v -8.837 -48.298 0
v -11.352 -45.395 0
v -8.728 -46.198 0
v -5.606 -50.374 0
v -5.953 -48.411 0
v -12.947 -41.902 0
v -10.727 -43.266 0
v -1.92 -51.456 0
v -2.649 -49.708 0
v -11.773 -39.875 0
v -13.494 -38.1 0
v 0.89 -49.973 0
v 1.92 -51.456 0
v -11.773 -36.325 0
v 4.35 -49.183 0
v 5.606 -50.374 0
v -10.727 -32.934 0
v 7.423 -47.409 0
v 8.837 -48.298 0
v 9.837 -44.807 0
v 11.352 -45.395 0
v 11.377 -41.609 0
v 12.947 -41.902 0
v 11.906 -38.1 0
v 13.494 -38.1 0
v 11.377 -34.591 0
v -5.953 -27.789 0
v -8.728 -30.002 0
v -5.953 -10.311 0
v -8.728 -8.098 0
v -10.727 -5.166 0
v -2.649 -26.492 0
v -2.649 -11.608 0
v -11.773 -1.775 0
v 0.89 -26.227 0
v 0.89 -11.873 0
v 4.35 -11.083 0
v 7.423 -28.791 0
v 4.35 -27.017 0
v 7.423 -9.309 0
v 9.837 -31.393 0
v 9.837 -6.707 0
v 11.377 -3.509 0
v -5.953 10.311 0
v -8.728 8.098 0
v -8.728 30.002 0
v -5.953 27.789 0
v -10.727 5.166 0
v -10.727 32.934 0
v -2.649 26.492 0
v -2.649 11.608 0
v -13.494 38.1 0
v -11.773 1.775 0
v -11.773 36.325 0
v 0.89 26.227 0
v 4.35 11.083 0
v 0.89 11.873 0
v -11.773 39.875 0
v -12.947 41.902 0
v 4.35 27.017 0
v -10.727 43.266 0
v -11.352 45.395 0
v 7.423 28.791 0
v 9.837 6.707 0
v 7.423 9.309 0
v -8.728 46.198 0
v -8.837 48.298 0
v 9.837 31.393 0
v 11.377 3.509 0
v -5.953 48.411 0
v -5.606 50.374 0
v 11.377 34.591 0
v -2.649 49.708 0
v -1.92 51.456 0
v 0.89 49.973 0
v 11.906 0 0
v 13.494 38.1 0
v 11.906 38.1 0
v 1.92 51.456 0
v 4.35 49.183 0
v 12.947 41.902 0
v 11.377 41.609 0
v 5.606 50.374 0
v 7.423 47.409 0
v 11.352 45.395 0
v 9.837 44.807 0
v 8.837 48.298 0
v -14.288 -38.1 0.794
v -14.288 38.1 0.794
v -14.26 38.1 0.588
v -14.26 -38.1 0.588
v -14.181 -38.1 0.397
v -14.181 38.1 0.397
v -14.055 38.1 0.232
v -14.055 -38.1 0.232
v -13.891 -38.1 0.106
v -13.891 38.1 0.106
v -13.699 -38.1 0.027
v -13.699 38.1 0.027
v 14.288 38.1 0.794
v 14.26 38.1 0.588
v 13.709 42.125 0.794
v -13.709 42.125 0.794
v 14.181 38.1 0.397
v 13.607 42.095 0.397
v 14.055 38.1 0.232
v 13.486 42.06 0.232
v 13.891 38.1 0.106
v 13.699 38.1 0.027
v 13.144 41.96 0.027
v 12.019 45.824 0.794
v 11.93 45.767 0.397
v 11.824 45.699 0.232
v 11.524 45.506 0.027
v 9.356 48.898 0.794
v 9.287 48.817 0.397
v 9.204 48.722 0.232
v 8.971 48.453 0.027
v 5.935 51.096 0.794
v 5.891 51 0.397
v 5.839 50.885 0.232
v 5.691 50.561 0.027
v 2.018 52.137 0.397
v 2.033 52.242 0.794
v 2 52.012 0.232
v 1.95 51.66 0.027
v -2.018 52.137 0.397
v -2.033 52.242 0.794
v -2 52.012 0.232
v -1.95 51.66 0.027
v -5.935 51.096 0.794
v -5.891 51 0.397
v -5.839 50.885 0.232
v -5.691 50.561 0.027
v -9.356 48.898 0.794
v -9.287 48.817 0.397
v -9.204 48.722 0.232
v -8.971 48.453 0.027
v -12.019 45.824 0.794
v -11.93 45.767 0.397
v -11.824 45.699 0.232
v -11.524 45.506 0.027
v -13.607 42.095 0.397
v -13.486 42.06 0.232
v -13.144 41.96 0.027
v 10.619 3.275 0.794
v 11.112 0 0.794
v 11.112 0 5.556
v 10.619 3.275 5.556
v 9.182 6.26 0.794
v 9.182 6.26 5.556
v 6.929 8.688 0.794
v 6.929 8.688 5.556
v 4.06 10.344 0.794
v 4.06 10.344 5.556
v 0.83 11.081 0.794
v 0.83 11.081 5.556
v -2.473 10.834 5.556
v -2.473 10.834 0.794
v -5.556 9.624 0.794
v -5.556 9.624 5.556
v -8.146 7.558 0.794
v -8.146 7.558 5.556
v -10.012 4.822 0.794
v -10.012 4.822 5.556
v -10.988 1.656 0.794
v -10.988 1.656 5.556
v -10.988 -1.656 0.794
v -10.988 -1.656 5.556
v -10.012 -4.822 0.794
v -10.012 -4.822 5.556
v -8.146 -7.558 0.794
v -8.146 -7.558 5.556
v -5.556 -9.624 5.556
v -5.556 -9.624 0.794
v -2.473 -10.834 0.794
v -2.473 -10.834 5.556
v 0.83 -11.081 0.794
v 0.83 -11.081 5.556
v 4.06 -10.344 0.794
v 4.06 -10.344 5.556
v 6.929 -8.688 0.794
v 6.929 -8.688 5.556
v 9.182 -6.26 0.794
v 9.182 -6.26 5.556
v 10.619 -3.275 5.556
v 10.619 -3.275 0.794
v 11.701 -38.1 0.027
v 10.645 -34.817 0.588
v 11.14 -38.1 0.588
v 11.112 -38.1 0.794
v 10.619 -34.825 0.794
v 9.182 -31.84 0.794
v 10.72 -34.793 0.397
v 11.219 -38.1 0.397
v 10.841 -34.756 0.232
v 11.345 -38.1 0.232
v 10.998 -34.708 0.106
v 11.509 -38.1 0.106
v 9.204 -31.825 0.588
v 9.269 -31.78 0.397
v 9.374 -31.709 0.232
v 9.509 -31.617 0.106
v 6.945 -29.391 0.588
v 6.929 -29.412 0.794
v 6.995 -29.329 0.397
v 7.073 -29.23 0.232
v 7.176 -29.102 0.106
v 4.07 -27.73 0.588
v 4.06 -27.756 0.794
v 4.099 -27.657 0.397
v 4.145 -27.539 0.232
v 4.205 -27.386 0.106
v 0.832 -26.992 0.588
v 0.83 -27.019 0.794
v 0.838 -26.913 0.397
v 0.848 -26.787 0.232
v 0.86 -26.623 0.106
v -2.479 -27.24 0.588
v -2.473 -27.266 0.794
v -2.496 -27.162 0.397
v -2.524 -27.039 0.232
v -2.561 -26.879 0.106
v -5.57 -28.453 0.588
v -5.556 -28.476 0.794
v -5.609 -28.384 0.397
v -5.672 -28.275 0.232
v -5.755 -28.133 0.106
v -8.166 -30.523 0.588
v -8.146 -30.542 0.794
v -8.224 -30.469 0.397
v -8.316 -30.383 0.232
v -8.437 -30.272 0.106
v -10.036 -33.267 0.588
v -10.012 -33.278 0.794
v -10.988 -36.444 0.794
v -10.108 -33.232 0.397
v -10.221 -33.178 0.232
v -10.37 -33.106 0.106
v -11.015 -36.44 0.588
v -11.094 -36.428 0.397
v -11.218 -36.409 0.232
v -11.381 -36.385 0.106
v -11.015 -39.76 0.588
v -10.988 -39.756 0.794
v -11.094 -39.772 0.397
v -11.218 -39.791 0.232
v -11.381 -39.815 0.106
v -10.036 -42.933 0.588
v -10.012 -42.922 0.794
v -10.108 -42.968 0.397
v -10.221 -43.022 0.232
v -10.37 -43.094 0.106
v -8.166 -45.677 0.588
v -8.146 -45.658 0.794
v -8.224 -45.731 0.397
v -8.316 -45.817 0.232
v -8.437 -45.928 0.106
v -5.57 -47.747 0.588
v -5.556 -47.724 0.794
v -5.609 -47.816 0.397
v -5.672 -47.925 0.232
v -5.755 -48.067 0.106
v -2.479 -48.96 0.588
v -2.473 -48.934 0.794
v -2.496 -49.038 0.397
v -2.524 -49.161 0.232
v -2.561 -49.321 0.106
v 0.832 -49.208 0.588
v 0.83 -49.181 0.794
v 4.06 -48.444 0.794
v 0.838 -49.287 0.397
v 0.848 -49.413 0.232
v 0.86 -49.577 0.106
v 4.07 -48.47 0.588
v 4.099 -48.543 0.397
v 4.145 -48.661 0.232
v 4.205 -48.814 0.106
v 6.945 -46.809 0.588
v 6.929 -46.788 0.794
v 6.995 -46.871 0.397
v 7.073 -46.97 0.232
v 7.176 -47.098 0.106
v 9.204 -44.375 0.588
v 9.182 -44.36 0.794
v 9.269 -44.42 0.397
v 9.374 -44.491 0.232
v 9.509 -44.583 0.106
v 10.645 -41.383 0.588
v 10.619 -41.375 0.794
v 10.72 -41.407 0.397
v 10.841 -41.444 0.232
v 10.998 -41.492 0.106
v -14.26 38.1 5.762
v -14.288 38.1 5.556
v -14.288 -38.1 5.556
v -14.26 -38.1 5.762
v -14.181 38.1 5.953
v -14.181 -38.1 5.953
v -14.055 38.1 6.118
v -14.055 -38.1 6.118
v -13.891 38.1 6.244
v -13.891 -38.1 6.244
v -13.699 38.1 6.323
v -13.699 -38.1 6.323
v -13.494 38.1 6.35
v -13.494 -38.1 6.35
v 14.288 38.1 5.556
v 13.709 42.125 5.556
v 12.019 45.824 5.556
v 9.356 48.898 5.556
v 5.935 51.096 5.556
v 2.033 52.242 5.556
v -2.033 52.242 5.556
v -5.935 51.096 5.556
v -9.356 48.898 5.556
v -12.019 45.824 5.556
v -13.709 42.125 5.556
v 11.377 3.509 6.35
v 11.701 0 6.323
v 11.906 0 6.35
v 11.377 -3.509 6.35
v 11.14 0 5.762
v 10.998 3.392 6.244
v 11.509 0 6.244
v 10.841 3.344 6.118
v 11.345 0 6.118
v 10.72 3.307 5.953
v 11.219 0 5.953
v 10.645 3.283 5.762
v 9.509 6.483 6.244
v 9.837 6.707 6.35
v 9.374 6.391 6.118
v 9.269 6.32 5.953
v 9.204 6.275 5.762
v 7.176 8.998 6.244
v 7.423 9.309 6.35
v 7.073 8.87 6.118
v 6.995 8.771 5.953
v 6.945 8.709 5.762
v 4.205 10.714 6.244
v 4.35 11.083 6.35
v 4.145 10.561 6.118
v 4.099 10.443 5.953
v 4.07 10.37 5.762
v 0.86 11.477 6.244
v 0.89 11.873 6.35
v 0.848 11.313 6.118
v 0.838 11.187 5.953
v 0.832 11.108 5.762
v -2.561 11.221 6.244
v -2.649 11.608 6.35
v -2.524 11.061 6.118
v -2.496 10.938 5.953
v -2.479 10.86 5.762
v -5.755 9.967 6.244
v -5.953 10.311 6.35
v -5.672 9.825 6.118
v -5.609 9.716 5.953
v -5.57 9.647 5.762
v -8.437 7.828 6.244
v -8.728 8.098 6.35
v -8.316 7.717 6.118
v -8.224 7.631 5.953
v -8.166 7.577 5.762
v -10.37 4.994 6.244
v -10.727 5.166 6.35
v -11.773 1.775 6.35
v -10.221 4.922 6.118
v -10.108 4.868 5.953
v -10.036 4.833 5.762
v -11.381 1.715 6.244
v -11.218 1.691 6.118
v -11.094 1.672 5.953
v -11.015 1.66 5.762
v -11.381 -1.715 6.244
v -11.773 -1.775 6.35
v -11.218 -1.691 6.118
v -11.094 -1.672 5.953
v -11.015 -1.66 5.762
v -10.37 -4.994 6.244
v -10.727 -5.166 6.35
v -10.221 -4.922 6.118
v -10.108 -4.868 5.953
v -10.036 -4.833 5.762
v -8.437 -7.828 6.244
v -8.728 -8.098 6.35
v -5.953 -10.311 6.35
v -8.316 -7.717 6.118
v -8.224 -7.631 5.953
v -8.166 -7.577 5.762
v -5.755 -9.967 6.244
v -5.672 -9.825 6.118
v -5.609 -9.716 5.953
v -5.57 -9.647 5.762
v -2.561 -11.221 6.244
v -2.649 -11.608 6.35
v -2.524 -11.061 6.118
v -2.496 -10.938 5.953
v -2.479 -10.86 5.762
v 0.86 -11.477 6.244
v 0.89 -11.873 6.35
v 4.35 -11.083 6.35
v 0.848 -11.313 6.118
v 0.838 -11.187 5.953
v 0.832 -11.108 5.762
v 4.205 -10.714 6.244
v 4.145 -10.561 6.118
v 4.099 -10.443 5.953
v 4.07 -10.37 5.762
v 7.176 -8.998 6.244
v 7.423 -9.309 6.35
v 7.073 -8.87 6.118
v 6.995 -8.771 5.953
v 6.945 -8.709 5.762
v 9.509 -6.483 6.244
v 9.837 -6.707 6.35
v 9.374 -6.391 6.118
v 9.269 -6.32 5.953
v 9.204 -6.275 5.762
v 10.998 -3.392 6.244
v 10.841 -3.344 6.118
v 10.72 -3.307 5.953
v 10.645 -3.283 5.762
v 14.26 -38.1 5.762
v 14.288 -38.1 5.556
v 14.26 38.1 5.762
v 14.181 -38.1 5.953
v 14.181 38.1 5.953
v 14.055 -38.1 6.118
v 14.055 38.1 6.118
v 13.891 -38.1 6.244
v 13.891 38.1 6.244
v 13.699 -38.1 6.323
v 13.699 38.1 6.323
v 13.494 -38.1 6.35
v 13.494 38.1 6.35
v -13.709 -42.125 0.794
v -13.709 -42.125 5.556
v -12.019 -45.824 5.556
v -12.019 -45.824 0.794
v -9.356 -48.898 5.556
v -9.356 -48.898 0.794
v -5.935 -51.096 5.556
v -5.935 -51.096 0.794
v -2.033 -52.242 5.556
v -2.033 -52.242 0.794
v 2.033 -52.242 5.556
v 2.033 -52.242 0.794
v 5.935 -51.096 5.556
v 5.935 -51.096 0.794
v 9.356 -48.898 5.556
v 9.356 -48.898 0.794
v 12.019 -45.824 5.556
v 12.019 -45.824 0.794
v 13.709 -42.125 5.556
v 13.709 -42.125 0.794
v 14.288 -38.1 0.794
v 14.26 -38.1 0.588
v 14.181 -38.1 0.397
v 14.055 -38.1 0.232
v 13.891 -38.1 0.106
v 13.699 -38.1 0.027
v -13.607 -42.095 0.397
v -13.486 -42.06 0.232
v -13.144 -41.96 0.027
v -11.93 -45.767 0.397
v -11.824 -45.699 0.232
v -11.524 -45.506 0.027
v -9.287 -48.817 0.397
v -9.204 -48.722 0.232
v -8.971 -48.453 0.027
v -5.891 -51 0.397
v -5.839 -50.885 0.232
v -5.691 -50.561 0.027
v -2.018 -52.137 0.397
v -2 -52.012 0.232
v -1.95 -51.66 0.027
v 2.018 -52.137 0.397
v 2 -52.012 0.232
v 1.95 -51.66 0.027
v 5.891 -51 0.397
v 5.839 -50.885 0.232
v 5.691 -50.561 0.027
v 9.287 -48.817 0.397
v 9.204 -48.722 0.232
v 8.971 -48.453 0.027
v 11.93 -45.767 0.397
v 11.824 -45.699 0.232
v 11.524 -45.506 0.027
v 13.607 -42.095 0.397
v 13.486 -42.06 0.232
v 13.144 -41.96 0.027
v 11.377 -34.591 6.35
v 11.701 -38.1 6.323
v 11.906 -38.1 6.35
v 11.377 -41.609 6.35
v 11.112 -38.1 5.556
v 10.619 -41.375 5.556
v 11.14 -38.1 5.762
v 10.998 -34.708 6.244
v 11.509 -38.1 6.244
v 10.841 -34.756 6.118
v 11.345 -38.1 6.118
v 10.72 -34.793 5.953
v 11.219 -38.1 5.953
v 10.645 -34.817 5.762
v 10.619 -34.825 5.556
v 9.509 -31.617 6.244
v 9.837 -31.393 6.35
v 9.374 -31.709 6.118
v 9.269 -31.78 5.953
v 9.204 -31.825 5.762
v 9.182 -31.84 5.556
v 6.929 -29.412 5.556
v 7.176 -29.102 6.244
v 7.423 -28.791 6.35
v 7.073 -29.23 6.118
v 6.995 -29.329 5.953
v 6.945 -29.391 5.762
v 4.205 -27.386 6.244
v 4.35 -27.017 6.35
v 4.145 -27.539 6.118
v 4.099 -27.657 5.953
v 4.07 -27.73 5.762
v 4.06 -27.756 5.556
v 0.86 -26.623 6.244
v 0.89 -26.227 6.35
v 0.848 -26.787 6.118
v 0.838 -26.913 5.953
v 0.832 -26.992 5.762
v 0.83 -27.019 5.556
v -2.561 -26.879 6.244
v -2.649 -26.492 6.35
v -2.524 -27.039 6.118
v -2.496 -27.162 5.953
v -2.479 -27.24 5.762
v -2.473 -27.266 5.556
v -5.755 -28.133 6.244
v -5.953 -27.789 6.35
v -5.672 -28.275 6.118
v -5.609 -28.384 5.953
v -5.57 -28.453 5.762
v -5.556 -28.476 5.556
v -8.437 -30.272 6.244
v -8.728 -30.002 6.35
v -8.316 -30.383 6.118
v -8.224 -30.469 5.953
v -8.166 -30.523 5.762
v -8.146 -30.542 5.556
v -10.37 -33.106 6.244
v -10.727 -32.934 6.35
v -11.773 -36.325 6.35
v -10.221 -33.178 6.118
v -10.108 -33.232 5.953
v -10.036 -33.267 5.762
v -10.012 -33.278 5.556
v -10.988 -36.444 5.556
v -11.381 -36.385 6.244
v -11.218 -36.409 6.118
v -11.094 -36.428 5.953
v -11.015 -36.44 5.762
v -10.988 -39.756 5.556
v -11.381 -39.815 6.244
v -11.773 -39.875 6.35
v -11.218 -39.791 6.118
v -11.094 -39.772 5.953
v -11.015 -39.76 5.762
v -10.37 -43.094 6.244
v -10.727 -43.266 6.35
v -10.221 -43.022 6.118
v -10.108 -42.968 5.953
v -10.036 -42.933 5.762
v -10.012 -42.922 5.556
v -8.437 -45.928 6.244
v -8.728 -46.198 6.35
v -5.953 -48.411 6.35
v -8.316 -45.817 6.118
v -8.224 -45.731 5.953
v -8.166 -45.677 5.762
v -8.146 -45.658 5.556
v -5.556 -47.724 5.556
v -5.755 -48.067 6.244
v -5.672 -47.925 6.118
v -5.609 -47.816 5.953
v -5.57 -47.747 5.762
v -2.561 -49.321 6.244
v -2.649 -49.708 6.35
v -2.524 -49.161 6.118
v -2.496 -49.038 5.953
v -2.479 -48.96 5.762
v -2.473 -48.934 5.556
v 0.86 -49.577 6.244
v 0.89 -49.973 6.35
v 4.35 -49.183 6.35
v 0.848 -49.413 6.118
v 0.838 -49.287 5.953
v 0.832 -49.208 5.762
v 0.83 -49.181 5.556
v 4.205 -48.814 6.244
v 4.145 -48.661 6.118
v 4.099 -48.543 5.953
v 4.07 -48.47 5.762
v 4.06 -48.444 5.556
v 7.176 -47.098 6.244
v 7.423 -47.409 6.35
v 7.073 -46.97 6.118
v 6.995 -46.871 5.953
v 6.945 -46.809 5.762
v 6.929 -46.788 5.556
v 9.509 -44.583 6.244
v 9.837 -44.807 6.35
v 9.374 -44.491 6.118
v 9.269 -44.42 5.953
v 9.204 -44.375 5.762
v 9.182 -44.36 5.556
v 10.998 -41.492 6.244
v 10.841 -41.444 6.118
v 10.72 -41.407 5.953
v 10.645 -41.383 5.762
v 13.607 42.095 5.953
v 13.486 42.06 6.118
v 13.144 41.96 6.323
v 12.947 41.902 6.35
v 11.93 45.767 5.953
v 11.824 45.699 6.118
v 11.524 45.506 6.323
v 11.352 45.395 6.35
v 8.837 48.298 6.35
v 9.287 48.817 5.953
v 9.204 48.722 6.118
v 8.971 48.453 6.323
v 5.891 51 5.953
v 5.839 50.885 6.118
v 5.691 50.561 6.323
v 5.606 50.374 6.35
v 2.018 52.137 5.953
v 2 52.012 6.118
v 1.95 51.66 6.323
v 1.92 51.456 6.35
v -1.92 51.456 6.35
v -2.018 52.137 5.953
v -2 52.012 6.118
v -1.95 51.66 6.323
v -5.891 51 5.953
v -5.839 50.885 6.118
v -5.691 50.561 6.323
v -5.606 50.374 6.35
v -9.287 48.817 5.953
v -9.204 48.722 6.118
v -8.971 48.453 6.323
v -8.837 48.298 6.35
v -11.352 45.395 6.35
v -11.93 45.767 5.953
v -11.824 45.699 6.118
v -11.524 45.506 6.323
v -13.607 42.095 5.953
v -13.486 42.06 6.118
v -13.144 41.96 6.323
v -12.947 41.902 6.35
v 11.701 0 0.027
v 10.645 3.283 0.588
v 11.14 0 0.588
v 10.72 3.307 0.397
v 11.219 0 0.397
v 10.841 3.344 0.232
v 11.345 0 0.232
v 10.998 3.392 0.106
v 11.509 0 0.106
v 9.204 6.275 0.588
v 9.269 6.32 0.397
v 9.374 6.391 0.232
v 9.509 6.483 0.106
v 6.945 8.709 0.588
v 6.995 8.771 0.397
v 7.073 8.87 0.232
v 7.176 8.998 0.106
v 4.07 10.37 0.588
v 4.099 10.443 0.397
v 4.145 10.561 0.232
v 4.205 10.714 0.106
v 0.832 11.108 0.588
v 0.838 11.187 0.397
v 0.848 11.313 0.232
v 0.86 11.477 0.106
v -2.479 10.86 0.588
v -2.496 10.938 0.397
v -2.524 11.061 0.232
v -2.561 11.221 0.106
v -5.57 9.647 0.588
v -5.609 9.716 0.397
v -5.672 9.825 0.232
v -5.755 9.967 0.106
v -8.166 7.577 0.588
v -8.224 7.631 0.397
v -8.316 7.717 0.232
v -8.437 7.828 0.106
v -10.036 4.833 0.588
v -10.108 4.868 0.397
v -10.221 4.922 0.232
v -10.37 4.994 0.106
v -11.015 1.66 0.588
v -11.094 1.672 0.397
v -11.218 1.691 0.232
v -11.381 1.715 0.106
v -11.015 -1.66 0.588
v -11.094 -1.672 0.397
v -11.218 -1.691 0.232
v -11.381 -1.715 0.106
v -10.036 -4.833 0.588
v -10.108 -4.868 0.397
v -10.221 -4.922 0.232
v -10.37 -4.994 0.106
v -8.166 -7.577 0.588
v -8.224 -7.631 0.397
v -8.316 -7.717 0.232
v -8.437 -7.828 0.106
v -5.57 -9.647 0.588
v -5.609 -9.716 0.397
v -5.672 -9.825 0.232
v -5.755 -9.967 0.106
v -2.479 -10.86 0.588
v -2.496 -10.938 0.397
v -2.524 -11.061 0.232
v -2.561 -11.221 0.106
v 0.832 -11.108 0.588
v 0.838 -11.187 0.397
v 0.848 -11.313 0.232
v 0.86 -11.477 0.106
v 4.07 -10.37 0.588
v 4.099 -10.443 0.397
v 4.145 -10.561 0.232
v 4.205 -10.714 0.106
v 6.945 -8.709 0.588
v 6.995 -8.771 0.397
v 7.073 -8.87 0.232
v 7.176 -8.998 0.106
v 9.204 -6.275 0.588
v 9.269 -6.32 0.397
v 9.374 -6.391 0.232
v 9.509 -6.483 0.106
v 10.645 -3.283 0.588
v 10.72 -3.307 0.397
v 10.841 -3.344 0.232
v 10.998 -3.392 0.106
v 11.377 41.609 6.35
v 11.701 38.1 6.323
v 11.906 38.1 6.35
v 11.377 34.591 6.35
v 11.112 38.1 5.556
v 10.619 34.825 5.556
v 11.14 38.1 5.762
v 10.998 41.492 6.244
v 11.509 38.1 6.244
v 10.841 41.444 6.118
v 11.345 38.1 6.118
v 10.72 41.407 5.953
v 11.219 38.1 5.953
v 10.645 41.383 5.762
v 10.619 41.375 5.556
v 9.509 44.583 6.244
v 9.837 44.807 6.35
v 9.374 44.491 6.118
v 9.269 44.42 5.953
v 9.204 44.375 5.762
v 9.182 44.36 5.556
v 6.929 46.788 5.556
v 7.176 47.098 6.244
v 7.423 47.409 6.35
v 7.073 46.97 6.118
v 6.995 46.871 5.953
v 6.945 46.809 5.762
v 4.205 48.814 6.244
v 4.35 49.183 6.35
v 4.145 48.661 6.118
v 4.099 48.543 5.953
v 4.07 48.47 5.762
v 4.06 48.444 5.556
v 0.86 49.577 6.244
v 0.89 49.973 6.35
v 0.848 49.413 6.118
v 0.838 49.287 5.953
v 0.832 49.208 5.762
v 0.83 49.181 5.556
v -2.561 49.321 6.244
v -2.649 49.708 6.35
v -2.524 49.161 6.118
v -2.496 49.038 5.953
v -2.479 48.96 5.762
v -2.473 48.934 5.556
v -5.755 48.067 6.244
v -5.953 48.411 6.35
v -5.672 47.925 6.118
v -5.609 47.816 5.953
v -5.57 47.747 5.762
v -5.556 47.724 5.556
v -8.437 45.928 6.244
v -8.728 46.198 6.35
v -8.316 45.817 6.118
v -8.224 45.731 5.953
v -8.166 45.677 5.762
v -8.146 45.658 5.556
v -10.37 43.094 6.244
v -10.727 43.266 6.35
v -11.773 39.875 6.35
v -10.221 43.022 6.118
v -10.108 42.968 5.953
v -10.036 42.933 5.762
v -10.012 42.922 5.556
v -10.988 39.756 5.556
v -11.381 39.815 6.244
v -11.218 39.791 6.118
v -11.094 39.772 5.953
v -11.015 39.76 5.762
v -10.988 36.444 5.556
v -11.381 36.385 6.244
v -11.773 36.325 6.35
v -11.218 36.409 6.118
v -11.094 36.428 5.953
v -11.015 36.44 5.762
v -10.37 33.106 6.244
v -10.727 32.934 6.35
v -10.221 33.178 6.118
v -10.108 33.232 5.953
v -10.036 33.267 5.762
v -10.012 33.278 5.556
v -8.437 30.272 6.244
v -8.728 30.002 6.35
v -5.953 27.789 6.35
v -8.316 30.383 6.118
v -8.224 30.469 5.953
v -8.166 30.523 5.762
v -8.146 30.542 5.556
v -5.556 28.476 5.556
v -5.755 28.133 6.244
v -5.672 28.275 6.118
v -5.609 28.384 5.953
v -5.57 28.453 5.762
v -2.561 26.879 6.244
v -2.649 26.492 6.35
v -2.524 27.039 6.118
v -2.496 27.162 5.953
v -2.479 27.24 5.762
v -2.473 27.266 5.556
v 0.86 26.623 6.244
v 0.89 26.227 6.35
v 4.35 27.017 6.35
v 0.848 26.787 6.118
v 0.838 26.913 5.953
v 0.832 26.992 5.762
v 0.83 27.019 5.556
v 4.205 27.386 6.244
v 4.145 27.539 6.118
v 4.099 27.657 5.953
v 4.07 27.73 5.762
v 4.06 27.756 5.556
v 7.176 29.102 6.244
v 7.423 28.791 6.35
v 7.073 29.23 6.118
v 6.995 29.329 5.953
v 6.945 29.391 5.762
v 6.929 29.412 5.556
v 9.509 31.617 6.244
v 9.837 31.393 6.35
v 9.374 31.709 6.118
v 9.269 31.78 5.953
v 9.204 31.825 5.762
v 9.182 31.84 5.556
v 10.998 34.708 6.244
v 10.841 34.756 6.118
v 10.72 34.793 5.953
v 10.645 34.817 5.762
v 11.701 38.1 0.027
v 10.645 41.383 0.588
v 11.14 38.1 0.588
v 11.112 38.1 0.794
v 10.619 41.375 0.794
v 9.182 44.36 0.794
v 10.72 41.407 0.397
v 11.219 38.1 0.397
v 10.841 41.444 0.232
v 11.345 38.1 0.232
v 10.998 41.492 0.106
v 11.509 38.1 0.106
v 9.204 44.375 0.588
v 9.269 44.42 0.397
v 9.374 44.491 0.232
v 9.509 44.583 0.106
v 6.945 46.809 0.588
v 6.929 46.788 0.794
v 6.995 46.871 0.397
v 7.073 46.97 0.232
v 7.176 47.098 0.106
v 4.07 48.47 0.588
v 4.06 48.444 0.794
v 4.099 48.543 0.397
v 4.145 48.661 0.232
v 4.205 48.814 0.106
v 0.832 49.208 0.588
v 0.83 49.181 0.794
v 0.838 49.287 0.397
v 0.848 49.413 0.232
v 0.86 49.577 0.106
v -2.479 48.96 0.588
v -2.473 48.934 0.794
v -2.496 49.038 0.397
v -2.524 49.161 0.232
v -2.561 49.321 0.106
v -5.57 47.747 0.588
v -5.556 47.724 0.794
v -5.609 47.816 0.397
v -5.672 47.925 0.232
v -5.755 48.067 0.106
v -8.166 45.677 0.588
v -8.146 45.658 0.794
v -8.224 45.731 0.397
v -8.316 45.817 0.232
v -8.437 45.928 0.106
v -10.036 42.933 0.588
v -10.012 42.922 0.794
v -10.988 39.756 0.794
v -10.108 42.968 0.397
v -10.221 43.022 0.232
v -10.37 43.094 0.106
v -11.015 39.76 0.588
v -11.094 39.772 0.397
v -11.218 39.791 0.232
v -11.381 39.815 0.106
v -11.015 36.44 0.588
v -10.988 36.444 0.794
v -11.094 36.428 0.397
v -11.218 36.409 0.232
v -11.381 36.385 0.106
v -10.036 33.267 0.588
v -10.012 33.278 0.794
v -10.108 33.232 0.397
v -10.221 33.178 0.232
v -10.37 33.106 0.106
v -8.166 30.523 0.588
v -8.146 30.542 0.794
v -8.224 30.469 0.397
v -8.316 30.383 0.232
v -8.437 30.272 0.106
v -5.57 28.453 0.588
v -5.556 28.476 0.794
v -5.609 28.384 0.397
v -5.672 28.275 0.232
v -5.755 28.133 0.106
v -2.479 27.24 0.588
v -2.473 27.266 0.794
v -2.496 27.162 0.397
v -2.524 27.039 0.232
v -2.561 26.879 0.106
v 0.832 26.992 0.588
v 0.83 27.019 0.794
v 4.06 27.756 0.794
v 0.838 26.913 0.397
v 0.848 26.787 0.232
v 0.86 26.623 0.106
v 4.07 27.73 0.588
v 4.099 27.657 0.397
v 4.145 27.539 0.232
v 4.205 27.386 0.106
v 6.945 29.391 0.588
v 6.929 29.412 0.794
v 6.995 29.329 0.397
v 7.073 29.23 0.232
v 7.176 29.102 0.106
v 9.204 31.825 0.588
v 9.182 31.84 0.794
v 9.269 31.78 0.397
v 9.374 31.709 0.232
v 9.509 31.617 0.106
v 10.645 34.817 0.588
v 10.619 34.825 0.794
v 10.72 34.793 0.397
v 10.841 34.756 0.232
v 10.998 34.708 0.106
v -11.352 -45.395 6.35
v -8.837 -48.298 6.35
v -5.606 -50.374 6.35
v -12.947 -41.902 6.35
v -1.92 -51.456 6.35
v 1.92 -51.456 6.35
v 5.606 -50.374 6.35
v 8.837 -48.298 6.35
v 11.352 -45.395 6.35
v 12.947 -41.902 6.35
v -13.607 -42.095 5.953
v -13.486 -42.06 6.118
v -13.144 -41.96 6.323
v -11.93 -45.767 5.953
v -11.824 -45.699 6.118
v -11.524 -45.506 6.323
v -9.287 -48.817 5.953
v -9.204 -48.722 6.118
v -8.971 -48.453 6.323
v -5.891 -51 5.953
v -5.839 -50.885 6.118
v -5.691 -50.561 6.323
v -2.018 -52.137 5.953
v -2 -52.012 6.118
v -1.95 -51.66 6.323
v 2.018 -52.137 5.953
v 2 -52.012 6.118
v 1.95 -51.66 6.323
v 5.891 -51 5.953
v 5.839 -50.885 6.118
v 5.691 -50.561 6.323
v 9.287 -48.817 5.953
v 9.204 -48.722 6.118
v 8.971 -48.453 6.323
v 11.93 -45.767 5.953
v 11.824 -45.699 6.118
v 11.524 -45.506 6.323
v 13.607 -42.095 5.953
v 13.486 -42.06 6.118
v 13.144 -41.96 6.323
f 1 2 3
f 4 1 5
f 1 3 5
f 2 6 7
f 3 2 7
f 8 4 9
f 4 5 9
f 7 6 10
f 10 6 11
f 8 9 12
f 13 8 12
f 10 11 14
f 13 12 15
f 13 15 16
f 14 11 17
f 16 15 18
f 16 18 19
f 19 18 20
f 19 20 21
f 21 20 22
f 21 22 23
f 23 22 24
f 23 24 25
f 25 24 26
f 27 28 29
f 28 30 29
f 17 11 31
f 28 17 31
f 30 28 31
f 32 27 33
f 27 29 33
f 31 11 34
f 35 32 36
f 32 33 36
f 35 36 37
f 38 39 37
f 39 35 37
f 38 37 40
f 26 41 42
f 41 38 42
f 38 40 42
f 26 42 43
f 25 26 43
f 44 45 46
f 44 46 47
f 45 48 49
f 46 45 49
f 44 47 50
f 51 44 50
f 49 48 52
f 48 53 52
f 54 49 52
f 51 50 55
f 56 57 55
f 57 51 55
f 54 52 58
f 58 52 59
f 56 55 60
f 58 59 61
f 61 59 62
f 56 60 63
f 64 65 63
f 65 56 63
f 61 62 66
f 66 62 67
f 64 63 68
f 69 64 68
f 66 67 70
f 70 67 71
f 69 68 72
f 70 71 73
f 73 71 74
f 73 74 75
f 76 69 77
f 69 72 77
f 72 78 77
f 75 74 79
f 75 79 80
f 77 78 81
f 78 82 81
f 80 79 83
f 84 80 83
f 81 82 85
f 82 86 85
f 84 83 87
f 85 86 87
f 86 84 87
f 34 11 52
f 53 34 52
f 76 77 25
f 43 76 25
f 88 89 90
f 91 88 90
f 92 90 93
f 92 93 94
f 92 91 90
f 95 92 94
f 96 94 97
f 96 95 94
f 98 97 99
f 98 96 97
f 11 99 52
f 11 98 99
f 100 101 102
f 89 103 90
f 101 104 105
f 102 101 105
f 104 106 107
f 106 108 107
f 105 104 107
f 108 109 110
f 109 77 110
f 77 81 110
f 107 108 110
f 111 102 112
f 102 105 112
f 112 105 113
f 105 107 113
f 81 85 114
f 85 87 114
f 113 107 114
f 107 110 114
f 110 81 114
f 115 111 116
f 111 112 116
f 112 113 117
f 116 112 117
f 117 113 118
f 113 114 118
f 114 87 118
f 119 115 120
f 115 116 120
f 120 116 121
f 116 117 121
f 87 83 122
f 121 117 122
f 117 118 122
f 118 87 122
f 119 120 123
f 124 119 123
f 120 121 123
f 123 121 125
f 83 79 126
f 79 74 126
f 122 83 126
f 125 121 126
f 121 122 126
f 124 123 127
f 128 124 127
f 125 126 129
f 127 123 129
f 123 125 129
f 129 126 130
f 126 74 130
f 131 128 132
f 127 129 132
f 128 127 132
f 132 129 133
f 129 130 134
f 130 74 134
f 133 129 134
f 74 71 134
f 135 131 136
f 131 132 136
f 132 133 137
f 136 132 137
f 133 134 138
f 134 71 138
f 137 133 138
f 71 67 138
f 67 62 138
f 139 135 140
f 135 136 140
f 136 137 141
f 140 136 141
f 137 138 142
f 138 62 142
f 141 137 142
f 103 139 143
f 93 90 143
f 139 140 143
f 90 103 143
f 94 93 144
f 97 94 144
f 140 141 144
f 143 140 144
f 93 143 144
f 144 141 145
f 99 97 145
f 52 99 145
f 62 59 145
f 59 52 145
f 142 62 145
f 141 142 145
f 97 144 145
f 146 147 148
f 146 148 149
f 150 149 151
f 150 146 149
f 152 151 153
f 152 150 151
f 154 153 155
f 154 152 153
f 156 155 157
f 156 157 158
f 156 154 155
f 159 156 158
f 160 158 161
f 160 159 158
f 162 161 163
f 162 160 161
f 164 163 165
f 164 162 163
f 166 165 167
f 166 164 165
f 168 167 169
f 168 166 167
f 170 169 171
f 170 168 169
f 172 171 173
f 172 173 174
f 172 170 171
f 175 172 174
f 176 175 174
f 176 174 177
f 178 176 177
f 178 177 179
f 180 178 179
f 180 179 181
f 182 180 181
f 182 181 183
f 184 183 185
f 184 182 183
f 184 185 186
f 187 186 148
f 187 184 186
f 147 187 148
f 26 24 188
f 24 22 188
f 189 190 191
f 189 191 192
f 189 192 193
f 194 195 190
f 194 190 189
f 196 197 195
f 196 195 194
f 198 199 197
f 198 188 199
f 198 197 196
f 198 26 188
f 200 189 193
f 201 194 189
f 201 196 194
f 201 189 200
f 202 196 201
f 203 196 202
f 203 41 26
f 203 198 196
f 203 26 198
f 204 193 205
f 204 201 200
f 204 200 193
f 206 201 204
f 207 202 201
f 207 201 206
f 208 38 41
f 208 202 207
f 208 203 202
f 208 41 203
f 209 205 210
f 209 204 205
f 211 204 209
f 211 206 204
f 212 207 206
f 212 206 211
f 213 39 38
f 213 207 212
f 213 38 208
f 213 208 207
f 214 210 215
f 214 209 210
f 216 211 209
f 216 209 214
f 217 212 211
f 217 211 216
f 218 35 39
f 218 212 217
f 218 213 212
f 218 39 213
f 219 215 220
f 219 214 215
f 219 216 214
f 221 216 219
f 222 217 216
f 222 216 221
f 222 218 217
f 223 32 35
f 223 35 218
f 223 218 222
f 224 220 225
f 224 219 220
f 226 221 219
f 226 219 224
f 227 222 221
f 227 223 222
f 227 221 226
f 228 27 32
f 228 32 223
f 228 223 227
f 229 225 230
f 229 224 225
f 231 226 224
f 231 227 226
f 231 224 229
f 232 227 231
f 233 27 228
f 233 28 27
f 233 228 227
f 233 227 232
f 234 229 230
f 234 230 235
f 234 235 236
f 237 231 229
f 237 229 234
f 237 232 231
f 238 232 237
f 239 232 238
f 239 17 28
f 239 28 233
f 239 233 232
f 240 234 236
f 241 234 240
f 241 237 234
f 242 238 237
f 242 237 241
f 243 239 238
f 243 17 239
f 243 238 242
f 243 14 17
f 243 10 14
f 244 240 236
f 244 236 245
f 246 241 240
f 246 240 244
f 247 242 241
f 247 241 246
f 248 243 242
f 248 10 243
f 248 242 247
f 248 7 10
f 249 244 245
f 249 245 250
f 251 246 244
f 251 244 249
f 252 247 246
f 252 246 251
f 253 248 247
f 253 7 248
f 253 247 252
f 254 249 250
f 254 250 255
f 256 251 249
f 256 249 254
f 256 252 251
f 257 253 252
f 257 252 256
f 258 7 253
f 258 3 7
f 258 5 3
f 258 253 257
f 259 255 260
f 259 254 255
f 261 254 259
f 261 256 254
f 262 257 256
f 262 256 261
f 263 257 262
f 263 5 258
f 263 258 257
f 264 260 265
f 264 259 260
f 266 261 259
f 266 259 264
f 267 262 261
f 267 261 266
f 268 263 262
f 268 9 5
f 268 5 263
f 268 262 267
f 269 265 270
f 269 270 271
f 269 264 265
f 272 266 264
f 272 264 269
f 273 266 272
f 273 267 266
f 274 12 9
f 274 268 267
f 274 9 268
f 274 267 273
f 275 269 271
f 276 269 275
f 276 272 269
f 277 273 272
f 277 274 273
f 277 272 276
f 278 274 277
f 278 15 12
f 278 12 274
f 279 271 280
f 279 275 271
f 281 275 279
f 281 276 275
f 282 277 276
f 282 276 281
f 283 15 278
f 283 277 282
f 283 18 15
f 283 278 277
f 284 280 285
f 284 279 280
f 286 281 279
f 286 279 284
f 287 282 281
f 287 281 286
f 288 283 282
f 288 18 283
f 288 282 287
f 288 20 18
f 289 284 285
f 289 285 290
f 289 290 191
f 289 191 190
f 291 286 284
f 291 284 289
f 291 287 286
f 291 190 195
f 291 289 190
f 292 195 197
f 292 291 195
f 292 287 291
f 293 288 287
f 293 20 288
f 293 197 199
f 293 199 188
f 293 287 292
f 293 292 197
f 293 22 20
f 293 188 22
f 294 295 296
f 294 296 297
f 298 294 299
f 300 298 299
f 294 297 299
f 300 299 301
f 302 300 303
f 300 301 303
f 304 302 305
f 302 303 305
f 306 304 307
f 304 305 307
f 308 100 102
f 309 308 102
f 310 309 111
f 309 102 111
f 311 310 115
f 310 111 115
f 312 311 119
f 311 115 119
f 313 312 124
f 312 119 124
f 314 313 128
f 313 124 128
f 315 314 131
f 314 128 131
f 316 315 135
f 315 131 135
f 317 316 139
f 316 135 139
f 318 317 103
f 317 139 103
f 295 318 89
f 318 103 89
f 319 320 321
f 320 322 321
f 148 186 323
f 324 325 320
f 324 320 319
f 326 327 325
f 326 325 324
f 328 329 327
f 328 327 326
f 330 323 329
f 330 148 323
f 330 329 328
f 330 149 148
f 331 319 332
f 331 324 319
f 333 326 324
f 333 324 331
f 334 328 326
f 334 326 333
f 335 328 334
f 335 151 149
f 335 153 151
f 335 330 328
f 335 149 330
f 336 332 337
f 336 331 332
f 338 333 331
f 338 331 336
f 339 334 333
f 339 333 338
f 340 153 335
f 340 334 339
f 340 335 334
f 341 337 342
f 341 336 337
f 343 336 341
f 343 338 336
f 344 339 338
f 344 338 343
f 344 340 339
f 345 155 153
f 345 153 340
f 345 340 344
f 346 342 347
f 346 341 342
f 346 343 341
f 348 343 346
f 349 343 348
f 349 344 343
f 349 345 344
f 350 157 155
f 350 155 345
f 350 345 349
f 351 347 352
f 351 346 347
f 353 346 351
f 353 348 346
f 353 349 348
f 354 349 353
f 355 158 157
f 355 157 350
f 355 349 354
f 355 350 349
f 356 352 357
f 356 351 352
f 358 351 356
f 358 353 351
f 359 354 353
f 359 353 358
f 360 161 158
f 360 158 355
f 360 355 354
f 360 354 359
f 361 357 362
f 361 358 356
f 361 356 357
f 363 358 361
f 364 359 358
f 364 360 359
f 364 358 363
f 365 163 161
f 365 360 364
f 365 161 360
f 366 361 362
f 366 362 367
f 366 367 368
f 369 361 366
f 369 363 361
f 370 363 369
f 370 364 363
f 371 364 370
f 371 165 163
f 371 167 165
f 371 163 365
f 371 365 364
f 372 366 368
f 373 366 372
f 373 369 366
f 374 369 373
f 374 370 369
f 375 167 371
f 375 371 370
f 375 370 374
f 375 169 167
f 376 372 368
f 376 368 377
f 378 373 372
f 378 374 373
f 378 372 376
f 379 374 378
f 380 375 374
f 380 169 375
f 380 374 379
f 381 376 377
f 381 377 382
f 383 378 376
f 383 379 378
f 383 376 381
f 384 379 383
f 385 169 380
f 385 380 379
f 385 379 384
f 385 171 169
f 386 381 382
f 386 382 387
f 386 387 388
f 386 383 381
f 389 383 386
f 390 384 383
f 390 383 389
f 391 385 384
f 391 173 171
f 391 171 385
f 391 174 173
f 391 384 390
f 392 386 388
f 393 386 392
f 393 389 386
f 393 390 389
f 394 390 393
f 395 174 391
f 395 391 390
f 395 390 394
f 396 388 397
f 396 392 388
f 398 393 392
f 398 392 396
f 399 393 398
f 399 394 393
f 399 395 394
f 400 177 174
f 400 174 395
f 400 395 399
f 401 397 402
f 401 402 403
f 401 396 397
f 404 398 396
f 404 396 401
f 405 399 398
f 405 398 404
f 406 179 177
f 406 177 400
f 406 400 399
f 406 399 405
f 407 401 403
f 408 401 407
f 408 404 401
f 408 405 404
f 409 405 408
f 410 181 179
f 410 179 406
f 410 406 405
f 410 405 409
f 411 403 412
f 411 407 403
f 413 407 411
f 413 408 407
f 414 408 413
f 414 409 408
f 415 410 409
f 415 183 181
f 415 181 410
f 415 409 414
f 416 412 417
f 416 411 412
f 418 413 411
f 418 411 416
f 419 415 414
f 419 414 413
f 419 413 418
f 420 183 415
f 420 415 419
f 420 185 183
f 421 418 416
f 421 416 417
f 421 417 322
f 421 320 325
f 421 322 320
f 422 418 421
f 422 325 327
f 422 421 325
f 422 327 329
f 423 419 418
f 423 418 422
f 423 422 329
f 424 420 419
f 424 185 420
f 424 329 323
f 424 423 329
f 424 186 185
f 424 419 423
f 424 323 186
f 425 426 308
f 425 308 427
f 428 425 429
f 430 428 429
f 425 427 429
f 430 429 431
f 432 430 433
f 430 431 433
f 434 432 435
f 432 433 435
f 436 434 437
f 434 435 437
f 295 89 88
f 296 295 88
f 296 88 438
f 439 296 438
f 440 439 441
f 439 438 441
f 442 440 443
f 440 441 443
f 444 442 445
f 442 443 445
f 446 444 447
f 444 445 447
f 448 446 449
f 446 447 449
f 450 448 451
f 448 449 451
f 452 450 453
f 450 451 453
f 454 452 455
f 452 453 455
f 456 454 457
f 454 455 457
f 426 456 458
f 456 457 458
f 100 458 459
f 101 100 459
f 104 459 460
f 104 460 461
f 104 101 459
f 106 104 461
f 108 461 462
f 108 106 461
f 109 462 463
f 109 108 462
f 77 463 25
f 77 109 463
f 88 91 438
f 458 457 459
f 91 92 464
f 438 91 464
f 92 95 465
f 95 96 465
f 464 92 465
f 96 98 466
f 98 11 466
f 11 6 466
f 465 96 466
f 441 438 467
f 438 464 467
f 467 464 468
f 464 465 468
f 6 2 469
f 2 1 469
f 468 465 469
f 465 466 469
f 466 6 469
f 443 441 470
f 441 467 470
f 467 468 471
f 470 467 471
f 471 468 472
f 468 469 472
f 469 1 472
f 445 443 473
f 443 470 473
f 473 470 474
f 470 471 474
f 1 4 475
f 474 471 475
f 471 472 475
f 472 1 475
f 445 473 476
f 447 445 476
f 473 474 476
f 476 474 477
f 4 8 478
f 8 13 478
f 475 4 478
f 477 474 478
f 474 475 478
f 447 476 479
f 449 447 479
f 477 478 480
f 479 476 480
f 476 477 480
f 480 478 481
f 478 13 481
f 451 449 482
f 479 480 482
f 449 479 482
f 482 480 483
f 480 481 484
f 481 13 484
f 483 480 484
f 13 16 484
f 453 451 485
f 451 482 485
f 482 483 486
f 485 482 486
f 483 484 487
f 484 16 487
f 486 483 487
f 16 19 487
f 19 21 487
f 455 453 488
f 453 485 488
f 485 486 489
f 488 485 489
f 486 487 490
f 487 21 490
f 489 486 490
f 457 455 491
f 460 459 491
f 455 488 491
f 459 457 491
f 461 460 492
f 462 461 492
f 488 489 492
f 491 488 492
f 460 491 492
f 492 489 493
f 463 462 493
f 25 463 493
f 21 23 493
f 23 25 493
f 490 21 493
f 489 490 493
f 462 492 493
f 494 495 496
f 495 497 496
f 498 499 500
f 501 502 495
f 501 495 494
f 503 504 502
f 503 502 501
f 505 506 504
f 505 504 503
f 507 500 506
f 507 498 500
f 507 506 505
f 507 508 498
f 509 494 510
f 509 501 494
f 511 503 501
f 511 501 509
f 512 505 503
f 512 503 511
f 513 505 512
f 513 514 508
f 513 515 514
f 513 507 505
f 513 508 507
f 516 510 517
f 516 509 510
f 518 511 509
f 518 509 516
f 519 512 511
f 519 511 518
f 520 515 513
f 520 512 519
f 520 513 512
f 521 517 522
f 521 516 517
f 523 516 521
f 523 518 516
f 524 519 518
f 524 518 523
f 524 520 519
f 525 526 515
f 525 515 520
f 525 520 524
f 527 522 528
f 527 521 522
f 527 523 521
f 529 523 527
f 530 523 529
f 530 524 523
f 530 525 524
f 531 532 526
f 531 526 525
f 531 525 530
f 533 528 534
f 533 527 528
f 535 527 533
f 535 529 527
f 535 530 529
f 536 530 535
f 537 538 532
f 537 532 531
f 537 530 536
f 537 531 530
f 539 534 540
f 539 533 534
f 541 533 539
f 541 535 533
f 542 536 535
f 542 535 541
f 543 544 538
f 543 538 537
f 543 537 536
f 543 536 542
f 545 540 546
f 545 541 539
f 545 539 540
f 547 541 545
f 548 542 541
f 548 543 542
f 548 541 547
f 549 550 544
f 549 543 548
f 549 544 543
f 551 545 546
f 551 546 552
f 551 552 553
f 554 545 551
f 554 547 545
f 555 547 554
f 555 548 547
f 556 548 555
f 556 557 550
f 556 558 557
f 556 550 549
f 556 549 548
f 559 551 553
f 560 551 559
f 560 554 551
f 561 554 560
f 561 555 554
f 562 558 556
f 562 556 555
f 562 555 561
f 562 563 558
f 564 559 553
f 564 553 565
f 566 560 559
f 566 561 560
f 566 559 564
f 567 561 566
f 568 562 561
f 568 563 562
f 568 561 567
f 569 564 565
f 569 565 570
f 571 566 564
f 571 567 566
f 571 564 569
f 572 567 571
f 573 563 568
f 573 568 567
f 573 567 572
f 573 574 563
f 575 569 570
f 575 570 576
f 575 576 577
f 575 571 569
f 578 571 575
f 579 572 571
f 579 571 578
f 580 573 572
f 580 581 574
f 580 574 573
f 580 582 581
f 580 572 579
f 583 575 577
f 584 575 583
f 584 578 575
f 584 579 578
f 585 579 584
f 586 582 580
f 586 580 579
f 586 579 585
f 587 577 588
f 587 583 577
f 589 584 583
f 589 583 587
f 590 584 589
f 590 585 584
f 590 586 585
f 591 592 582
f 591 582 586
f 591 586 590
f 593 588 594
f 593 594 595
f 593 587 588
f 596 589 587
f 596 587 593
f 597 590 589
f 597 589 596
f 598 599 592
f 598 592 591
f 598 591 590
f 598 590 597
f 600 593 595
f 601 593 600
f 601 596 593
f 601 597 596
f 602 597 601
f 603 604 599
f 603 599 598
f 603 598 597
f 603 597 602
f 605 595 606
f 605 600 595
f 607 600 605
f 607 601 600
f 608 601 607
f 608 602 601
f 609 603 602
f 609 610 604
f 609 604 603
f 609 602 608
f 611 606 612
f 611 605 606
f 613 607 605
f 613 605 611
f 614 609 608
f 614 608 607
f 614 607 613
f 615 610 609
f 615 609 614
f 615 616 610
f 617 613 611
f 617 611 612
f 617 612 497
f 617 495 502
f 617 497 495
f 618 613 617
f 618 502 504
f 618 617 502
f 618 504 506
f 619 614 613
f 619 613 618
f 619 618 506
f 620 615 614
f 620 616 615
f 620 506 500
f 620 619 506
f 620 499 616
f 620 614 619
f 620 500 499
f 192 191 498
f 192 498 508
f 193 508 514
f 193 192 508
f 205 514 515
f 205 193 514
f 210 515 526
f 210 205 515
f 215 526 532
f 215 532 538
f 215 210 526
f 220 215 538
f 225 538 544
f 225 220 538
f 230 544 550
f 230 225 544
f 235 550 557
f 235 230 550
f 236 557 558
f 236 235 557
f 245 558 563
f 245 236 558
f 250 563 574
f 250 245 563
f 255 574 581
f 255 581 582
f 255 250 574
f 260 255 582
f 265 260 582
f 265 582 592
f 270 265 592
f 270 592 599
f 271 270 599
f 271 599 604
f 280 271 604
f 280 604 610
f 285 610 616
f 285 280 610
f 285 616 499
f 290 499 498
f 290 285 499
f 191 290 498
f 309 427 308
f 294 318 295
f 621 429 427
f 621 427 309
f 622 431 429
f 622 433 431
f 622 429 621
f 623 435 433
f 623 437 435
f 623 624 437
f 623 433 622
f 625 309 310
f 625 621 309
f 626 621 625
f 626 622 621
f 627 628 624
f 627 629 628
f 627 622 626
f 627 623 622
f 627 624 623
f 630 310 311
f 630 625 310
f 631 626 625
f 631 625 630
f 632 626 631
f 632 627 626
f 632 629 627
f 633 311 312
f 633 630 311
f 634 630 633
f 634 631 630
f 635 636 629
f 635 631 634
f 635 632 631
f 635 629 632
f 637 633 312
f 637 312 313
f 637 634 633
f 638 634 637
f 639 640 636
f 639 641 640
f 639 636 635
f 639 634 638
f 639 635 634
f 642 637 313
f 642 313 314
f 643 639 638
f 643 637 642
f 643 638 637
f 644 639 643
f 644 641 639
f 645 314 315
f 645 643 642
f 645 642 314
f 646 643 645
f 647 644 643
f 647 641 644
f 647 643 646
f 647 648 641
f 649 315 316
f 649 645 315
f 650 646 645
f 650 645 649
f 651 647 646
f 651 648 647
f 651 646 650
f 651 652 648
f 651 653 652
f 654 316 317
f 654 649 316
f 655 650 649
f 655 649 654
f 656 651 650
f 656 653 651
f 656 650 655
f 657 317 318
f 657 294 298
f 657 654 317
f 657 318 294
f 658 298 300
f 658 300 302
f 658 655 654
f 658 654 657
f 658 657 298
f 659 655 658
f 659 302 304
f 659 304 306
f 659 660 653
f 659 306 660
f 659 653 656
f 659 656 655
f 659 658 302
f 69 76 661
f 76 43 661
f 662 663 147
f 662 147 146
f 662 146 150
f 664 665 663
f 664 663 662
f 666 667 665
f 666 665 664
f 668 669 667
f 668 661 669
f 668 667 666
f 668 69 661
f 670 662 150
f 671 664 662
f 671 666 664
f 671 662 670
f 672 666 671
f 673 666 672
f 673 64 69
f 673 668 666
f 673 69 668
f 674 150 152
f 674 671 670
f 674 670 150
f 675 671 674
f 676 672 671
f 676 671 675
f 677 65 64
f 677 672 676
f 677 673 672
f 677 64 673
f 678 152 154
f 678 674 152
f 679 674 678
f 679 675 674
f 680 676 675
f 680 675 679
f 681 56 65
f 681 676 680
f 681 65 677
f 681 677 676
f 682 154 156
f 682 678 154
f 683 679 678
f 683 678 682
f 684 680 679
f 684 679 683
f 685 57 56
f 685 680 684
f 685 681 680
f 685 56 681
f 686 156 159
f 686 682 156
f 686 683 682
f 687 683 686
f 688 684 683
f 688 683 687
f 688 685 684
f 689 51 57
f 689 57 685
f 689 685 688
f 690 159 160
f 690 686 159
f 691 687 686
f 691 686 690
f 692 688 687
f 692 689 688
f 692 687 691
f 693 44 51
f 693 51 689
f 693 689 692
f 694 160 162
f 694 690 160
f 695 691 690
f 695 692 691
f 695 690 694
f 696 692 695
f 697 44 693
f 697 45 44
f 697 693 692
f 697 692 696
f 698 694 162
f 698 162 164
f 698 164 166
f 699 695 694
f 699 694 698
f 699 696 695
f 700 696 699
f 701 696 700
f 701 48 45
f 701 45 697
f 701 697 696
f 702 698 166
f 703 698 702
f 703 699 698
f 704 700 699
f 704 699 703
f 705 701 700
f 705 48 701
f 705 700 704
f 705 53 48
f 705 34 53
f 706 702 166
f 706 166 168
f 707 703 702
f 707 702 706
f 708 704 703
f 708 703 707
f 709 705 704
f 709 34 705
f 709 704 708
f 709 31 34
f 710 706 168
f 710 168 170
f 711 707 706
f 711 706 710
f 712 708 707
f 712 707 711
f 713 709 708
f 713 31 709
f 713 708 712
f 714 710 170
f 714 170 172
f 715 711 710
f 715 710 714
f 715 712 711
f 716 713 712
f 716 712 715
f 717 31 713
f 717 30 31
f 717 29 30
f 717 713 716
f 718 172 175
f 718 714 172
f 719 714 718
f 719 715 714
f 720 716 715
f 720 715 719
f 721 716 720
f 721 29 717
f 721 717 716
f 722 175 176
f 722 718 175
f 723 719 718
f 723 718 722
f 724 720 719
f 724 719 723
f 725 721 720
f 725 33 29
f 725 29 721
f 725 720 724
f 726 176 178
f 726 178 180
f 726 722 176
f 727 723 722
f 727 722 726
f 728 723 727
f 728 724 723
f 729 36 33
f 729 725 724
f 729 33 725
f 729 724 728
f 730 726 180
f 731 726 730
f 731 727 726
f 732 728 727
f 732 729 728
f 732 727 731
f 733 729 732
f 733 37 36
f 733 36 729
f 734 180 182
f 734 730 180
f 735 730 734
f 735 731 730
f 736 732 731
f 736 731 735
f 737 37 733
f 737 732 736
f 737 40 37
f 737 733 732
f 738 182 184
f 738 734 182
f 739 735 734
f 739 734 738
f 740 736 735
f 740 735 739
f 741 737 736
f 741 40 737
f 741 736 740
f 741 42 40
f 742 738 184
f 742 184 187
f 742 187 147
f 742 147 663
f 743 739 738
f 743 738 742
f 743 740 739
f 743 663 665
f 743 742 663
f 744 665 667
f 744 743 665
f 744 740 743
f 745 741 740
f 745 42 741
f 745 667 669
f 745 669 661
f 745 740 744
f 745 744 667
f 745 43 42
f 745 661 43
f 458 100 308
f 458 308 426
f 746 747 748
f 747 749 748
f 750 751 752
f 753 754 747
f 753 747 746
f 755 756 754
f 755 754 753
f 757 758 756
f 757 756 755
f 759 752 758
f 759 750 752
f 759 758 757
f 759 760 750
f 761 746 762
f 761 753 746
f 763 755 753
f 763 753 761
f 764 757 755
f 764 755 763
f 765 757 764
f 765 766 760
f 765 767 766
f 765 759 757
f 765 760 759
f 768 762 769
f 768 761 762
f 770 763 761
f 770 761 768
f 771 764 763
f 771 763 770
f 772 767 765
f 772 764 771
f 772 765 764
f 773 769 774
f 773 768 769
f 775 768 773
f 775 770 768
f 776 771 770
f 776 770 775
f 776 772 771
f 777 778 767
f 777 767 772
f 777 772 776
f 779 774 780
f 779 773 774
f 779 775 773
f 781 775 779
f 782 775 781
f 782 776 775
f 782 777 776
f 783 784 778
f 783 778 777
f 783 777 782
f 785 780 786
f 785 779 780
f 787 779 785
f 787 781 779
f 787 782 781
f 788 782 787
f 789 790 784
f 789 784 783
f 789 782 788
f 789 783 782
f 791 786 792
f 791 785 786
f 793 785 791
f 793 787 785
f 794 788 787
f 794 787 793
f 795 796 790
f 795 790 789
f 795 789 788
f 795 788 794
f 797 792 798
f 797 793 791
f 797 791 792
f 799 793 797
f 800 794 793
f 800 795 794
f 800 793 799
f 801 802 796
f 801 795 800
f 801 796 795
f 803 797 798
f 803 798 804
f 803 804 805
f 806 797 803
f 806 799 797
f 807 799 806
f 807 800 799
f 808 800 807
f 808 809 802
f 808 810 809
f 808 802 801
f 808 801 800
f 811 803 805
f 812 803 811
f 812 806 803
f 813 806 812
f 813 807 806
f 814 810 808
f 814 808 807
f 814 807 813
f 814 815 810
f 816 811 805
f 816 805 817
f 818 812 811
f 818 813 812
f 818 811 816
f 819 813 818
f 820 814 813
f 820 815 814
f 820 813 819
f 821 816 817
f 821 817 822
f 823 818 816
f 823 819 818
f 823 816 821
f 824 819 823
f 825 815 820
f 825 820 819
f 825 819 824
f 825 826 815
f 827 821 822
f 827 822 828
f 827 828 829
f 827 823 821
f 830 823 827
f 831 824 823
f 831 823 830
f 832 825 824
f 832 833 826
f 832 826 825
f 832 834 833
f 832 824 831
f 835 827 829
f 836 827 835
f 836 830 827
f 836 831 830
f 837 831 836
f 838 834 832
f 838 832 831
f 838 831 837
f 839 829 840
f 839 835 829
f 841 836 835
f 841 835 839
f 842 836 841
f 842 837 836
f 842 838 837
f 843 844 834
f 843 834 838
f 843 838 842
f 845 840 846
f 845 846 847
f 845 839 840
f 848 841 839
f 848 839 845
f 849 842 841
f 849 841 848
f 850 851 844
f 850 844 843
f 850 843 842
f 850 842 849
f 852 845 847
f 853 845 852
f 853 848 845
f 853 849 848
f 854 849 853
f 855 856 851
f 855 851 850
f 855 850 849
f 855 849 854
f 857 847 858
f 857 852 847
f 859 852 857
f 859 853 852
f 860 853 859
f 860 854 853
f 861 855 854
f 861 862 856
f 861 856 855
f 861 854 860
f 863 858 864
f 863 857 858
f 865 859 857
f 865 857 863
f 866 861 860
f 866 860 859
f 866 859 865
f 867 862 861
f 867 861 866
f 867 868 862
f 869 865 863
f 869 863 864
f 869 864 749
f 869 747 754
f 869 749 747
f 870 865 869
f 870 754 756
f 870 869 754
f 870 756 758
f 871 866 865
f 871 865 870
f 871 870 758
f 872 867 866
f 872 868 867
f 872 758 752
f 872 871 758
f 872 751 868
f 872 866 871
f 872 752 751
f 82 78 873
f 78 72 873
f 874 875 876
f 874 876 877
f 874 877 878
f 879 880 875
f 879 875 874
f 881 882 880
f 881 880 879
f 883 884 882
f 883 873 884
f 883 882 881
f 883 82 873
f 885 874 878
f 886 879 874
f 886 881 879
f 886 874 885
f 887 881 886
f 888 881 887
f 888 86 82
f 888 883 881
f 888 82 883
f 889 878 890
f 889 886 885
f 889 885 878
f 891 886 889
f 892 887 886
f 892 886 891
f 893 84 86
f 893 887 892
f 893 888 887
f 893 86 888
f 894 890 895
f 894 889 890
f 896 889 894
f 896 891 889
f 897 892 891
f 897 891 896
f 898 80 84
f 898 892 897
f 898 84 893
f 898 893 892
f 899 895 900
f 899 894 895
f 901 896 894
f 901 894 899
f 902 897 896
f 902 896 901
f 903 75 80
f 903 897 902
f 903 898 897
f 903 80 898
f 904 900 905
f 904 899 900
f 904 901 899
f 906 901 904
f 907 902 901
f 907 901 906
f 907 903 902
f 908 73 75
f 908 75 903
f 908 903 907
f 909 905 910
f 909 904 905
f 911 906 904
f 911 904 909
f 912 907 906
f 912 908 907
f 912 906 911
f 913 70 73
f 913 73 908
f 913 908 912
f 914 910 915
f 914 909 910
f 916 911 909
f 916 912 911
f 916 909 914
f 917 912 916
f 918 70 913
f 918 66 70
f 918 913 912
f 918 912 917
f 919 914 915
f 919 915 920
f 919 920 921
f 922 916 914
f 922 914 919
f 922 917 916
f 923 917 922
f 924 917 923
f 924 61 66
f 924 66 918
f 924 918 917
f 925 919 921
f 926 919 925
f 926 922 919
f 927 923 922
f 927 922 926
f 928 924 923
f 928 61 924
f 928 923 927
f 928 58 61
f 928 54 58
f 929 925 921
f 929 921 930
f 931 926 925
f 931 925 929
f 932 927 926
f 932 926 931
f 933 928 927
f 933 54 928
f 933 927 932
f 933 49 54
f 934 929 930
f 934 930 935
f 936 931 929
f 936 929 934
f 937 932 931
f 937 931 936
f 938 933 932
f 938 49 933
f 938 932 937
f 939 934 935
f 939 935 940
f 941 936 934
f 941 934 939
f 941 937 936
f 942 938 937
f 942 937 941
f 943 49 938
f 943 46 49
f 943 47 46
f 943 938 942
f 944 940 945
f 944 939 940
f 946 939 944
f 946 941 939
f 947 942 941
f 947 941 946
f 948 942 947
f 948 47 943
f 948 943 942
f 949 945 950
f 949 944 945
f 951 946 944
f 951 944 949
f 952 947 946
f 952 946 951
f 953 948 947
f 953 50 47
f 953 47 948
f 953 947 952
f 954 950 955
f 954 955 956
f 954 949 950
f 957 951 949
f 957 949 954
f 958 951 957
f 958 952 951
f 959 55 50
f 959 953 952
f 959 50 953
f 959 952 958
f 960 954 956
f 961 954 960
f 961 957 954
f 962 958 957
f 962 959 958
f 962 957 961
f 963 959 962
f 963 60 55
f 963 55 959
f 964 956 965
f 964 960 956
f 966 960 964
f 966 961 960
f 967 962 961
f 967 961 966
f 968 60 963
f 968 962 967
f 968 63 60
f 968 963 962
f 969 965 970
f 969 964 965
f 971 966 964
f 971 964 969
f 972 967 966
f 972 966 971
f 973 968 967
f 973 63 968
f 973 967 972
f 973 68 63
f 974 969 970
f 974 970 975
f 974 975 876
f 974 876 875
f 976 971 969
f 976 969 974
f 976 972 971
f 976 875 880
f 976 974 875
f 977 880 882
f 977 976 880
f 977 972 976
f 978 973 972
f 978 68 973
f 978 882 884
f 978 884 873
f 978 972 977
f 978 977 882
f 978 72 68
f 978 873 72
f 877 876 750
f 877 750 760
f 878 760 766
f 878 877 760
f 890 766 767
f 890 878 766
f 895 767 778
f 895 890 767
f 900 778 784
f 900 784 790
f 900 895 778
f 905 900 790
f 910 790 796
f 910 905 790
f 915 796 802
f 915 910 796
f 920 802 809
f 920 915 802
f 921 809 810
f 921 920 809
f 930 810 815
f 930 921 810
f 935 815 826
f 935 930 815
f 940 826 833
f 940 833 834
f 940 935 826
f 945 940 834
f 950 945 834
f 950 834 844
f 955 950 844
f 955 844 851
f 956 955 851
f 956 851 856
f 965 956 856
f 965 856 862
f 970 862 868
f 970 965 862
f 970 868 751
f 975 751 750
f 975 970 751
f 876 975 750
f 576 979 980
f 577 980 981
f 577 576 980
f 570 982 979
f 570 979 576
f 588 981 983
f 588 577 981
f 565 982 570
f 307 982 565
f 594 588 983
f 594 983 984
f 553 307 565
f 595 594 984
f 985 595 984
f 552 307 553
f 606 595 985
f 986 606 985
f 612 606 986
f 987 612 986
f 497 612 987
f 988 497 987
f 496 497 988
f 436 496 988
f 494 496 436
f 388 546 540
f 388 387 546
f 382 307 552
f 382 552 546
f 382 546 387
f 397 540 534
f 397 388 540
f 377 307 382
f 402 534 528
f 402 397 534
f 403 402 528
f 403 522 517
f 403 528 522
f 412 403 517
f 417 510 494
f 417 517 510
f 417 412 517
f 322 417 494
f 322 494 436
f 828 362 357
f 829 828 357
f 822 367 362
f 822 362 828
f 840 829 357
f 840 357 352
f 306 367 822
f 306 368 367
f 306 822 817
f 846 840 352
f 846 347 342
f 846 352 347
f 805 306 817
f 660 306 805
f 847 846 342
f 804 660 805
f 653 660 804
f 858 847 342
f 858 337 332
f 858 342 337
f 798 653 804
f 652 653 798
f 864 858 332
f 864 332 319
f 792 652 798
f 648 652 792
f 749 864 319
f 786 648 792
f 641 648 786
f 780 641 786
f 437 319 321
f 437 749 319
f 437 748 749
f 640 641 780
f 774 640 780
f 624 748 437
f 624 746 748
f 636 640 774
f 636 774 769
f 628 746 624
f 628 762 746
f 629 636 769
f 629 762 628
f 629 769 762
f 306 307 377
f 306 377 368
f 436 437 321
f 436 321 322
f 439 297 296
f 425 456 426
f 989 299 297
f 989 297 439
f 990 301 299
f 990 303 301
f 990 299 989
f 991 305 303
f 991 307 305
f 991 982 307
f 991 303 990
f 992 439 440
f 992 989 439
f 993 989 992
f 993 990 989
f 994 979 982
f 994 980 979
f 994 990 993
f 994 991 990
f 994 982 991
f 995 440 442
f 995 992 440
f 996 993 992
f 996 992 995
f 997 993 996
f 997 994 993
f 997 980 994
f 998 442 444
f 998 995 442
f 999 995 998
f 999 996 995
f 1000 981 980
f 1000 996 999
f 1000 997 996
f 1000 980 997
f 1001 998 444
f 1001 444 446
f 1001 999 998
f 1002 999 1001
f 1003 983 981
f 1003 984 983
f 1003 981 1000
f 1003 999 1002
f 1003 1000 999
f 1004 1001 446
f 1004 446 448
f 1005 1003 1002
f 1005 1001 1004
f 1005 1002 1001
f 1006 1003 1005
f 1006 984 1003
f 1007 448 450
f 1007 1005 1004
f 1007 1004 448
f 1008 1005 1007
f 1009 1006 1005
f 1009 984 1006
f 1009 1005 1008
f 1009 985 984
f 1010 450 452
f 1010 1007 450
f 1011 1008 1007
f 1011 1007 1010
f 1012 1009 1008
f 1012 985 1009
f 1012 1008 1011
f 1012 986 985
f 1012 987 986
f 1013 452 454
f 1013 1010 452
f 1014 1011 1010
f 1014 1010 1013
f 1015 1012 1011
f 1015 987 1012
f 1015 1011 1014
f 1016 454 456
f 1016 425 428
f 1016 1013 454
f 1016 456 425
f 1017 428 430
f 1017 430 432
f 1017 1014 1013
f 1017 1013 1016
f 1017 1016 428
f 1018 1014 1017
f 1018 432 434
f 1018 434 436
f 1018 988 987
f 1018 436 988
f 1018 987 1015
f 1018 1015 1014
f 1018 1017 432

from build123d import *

# Parameters (mm, degrees)
SKETCH002_R  = 11.1125
PAD002_DEPTH = 6.35
FILLET004_R  = 0.79375
FILLET005_R  = 0.79375


with BuildPart() as part:
    # Sketch002 → Pad002 (new body)
    with BuildSketch(Plane.XY):
        with BuildLine():
            ThreePointArc((14.2875, 38.1), (0, 52.3875), (-14.2875, 38.1))
            Line((-14.2875, 38.1), (-14.2875, -38.1))
            ThreePointArc((-14.2875, -38.1), (0, -52.3875), (14.2875, -38.1))
            Line((14.2875, 38.1), (14.2875, -38.1))
        make_face()
        with Locations((0, 38.1)):
            Circle(SKETCH002_R, mode=Mode.SUBTRACT)
        with Locations((0, -38.1)):
            Circle(SKETCH002_R, mode=Mode.SUBTRACT)
        Circle(SKETCH002_R, mode=Mode.SUBTRACT)
    extrude(amount=PAD002_DEPTH)

    # Fillet004
    fillet004_edges = [part.edges().sort_by_distance(p)[0] for p in [
        (0, 52.3875, 0),
        (-14.2875, 0, 0),
        (0, -52.3875, 0),
        (14.2875, 0, 0),
        (-11.1125, 0, 0),
        (-11.1125, -38.1, 0),
        (-11.1125, 38.1, 0),
    ]]
    fillet(fillet004_edges, radius=FILLET004_R)

    # Fillet005
    fillet005_edges = [part.edges().sort_by_distance(p)[0] for p in [
        (0, 52.3875, 6.35),
        (-14.2875, 0, 6.35),
        (0, -52.3875, 6.35),
        (14.2875, 0, 6.35),
        (-11.1125, 0, 6.35),
        (-11.1125, -38.1, 6.35),
        (-11.1125, 38.1, 6.35),
    ]]
    fillet(fillet005_edges, radius=FILLET005_R)


solid = part.part
